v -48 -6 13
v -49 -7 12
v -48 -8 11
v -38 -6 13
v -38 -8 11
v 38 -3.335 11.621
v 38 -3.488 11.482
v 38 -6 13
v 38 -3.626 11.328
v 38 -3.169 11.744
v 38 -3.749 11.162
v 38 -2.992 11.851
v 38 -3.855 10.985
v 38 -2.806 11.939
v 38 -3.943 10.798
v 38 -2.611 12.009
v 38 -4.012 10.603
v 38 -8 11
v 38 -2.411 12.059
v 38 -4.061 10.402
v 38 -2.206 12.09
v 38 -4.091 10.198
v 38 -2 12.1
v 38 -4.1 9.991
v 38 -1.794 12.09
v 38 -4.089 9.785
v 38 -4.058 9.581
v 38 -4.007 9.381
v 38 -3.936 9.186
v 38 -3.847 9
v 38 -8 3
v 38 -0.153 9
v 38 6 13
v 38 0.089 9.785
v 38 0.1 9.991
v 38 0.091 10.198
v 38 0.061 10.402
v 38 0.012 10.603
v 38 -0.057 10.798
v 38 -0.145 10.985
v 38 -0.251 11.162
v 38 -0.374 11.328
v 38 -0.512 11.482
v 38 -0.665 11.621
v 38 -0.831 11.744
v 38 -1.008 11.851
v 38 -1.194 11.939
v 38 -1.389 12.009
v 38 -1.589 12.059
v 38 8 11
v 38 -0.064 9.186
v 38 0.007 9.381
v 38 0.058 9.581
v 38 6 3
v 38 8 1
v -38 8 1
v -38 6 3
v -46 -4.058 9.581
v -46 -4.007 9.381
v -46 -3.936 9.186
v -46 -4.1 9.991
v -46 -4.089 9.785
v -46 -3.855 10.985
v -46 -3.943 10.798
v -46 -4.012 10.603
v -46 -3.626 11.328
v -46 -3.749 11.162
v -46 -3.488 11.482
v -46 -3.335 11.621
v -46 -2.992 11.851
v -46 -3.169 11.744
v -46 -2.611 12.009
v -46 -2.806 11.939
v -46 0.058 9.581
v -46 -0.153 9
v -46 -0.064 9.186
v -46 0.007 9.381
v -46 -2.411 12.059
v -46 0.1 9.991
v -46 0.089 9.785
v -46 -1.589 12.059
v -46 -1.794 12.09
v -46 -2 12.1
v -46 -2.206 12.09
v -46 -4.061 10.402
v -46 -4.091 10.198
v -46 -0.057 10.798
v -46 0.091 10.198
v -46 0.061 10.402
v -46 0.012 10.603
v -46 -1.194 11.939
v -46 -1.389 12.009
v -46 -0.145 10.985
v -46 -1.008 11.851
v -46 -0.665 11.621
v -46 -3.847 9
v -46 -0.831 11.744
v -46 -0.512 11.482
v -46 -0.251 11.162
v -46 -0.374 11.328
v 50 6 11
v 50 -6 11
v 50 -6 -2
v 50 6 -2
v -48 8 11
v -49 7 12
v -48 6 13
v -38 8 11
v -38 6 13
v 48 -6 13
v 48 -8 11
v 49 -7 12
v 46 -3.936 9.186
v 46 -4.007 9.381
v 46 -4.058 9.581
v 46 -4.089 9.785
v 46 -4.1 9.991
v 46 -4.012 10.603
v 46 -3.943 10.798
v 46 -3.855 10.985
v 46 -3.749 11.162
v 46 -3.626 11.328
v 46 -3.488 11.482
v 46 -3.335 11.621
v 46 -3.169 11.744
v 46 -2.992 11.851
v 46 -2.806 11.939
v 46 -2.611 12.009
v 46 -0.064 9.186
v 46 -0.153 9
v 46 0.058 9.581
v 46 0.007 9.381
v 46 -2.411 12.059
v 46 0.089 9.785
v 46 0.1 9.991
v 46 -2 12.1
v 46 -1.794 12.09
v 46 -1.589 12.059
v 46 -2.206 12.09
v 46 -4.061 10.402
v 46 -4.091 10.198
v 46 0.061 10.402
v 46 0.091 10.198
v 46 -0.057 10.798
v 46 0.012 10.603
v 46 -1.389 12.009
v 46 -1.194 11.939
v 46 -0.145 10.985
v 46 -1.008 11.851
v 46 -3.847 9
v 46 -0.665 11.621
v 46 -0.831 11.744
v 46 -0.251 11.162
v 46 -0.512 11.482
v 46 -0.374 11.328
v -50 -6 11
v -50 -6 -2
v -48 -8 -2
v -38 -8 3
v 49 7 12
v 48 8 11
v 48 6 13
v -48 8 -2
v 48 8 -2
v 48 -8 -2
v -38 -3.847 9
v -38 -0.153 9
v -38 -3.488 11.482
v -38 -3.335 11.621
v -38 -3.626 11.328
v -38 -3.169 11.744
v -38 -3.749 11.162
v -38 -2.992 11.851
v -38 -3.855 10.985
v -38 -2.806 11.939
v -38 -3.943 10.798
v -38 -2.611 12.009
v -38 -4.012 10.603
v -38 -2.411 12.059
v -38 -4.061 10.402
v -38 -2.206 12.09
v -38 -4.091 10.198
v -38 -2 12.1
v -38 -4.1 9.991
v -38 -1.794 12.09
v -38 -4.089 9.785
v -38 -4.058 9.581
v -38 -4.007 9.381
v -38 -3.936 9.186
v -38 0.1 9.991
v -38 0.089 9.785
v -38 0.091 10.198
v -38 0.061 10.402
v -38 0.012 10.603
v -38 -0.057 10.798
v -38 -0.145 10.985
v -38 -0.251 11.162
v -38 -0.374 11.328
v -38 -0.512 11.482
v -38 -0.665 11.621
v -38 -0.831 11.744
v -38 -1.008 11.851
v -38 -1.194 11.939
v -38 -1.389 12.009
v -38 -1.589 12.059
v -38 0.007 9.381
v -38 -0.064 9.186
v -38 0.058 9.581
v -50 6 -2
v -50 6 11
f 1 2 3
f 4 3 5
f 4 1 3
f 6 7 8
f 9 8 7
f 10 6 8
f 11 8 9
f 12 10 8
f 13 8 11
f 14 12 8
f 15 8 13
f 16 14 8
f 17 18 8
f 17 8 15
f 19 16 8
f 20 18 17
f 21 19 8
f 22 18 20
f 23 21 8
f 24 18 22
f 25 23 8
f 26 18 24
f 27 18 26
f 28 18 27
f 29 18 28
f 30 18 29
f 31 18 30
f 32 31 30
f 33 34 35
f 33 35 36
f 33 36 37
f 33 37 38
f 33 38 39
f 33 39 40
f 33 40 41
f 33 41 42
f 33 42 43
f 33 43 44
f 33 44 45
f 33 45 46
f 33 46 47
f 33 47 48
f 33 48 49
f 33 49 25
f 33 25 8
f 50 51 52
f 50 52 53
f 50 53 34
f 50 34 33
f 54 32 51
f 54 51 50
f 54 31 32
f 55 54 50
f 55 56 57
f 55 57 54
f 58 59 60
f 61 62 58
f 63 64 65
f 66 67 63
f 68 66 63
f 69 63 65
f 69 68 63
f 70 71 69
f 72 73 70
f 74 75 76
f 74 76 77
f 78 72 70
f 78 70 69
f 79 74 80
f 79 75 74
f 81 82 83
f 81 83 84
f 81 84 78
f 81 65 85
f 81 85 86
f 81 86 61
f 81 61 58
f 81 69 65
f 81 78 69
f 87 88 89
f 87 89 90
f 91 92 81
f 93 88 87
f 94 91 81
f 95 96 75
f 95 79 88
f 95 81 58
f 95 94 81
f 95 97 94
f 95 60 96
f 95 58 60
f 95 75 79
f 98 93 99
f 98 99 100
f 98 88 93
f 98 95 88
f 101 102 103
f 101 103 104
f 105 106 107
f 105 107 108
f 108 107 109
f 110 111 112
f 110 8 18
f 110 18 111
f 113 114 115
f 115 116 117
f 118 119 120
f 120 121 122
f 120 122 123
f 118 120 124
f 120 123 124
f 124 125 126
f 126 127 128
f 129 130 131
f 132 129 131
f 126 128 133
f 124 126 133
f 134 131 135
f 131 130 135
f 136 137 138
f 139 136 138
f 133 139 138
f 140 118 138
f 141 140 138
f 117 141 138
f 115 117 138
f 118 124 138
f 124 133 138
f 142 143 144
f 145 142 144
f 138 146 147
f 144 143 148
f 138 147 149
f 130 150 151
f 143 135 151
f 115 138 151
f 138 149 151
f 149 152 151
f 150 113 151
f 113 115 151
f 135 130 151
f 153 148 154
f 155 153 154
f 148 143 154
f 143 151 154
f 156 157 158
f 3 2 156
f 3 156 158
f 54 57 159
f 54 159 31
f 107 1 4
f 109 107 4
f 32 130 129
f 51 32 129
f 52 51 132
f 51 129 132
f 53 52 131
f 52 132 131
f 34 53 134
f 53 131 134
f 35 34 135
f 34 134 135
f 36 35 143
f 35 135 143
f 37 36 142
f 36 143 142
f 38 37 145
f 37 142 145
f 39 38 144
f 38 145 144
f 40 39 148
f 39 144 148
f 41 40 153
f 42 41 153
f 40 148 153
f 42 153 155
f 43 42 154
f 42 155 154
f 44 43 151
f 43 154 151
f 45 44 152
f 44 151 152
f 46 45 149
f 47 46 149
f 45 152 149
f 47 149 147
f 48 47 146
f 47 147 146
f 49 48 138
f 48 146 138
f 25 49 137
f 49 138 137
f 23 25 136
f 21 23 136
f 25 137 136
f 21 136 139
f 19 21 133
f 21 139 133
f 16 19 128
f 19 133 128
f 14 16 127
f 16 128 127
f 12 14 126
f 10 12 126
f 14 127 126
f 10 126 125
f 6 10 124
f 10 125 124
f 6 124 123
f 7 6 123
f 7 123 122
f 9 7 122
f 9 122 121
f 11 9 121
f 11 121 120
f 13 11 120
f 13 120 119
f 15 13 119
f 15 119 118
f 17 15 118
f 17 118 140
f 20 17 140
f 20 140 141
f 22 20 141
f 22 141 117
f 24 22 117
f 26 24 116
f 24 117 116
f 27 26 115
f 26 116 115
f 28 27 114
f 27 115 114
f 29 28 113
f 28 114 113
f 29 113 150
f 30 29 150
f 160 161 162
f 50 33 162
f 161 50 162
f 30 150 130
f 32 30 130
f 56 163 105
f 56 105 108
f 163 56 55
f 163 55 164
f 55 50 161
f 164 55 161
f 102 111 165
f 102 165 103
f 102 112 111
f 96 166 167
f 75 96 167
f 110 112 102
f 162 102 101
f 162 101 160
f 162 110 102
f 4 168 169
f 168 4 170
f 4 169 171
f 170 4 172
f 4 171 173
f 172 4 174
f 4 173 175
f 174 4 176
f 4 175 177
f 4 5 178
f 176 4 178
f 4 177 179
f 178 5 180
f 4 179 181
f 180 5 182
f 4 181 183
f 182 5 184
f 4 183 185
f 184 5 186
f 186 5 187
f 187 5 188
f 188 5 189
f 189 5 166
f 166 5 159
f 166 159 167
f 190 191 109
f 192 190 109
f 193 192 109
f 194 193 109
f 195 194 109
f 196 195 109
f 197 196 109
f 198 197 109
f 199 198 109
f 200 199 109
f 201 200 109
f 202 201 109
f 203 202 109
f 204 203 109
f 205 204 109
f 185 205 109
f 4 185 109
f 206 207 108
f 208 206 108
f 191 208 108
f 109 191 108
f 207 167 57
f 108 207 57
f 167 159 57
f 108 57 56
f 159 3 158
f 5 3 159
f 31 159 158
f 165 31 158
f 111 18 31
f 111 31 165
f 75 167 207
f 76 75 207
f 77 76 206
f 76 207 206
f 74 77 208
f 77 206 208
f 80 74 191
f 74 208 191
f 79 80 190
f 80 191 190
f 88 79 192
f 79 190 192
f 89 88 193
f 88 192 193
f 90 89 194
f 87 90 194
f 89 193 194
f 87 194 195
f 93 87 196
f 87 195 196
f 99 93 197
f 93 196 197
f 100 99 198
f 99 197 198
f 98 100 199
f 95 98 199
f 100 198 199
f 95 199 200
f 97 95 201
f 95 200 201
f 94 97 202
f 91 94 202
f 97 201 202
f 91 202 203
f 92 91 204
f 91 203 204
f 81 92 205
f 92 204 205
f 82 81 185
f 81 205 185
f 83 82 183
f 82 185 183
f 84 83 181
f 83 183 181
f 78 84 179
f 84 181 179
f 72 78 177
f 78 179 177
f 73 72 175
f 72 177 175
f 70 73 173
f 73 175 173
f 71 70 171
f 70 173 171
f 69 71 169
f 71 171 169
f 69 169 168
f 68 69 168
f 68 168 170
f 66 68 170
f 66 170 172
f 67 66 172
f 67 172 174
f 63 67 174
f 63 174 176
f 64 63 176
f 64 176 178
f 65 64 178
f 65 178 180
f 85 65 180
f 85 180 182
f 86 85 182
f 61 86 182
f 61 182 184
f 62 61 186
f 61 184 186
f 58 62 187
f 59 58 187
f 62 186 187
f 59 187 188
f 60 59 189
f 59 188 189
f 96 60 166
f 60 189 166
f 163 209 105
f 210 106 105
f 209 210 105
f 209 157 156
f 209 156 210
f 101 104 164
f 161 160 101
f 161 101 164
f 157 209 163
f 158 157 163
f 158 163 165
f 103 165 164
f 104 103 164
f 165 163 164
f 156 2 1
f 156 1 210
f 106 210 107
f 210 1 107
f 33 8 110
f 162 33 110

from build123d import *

# Parameters (mm, degrees)
F0_W          = 100
F0_H          = 16
F1_DEPTH      = 3
F2_W          = 12
F2_H          = 16
F3_DEPTH      = 10
F4_SIZE       = 2
F5_SIZE       = 2
F6_SIZE       = 2
F8_DEPTH      = 84
F8_DEPTH_BACK = 8
F9_DEPTH      = 2


with BuildPart() as f1:
    # F0 (on Top) → F1 (new body)
    with BuildSketch(Plane.XY):
        Rectangle(F0_W, F0_H)
    extrude(amount=F1_DEPTH)

    # F2 (on face) → F3 (join)
    with BuildSketch(Plane.XY.offset(3)):
        with Locations((-44, 0)):
            Rectangle(F2_W, F2_H)
        with Locations((44, 0)):
            Rectangle(F2_W, F2_H)
    extrude(amount=F3_DEPTH)

    # F4
    f4_edges = [f1.edges().sort_by_distance(p)[0] for p in [
        (-50, 8, 6.5),
        (-50, 0, 13),
        (-50, -8, 6.5),
        (50, -8, 6.5),
        (50, 0, 13),
        (50, 8, 6.5),
    ]]
    chamfer(f4_edges, length=F4_SIZE)

    # F5
    f5_edges = [f1.edges().sort_by_distance(p)[0] for p in [
        (-43, -8, 13),
        (-43, 8, 13),
        (43, 8, 13),
        (43, -8, 13),
    ]]
    chamfer(f5_edges, length=F5_SIZE)

    # F6
    f6_edges = [f1.edges().sort_by_distance(p)[0] for p in [
        (0, 8, 3),
    ]]
    chamfer(f6_edges, length=F6_SIZE)

    # F9 (add): a face of the model
    f9_faces = [f1.faces().sort_by_distance(p)[0] for p in [
        (0, 0, 0),
    ]]
    extrude(f9_faces, amount=F9_DEPTH)


with BuildPart() as f8:
    # F7 (on face) → F8 (new body, two sides)
    with BuildSketch(Plane.YZ.offset(-38)) as f8_sk:
        with BuildLine():
            Line((-3.8466185313, 9), (-0.1533814687, 9))
            ThreePointArc((-0.1533814687, 9), (-2, 12.1), (-3.8466185313, 9))
        make_face()
    extrude(amount=F8_DEPTH)
    extrude(f8_sk.sketch, amount=-F8_DEPTH_BACK)


with BuildPart() as f1_1:
    add(f1.part)

    # F10: cut F8
    add(f8.part, mode=Mode.SUBTRACT)


solid = f1_1.part
